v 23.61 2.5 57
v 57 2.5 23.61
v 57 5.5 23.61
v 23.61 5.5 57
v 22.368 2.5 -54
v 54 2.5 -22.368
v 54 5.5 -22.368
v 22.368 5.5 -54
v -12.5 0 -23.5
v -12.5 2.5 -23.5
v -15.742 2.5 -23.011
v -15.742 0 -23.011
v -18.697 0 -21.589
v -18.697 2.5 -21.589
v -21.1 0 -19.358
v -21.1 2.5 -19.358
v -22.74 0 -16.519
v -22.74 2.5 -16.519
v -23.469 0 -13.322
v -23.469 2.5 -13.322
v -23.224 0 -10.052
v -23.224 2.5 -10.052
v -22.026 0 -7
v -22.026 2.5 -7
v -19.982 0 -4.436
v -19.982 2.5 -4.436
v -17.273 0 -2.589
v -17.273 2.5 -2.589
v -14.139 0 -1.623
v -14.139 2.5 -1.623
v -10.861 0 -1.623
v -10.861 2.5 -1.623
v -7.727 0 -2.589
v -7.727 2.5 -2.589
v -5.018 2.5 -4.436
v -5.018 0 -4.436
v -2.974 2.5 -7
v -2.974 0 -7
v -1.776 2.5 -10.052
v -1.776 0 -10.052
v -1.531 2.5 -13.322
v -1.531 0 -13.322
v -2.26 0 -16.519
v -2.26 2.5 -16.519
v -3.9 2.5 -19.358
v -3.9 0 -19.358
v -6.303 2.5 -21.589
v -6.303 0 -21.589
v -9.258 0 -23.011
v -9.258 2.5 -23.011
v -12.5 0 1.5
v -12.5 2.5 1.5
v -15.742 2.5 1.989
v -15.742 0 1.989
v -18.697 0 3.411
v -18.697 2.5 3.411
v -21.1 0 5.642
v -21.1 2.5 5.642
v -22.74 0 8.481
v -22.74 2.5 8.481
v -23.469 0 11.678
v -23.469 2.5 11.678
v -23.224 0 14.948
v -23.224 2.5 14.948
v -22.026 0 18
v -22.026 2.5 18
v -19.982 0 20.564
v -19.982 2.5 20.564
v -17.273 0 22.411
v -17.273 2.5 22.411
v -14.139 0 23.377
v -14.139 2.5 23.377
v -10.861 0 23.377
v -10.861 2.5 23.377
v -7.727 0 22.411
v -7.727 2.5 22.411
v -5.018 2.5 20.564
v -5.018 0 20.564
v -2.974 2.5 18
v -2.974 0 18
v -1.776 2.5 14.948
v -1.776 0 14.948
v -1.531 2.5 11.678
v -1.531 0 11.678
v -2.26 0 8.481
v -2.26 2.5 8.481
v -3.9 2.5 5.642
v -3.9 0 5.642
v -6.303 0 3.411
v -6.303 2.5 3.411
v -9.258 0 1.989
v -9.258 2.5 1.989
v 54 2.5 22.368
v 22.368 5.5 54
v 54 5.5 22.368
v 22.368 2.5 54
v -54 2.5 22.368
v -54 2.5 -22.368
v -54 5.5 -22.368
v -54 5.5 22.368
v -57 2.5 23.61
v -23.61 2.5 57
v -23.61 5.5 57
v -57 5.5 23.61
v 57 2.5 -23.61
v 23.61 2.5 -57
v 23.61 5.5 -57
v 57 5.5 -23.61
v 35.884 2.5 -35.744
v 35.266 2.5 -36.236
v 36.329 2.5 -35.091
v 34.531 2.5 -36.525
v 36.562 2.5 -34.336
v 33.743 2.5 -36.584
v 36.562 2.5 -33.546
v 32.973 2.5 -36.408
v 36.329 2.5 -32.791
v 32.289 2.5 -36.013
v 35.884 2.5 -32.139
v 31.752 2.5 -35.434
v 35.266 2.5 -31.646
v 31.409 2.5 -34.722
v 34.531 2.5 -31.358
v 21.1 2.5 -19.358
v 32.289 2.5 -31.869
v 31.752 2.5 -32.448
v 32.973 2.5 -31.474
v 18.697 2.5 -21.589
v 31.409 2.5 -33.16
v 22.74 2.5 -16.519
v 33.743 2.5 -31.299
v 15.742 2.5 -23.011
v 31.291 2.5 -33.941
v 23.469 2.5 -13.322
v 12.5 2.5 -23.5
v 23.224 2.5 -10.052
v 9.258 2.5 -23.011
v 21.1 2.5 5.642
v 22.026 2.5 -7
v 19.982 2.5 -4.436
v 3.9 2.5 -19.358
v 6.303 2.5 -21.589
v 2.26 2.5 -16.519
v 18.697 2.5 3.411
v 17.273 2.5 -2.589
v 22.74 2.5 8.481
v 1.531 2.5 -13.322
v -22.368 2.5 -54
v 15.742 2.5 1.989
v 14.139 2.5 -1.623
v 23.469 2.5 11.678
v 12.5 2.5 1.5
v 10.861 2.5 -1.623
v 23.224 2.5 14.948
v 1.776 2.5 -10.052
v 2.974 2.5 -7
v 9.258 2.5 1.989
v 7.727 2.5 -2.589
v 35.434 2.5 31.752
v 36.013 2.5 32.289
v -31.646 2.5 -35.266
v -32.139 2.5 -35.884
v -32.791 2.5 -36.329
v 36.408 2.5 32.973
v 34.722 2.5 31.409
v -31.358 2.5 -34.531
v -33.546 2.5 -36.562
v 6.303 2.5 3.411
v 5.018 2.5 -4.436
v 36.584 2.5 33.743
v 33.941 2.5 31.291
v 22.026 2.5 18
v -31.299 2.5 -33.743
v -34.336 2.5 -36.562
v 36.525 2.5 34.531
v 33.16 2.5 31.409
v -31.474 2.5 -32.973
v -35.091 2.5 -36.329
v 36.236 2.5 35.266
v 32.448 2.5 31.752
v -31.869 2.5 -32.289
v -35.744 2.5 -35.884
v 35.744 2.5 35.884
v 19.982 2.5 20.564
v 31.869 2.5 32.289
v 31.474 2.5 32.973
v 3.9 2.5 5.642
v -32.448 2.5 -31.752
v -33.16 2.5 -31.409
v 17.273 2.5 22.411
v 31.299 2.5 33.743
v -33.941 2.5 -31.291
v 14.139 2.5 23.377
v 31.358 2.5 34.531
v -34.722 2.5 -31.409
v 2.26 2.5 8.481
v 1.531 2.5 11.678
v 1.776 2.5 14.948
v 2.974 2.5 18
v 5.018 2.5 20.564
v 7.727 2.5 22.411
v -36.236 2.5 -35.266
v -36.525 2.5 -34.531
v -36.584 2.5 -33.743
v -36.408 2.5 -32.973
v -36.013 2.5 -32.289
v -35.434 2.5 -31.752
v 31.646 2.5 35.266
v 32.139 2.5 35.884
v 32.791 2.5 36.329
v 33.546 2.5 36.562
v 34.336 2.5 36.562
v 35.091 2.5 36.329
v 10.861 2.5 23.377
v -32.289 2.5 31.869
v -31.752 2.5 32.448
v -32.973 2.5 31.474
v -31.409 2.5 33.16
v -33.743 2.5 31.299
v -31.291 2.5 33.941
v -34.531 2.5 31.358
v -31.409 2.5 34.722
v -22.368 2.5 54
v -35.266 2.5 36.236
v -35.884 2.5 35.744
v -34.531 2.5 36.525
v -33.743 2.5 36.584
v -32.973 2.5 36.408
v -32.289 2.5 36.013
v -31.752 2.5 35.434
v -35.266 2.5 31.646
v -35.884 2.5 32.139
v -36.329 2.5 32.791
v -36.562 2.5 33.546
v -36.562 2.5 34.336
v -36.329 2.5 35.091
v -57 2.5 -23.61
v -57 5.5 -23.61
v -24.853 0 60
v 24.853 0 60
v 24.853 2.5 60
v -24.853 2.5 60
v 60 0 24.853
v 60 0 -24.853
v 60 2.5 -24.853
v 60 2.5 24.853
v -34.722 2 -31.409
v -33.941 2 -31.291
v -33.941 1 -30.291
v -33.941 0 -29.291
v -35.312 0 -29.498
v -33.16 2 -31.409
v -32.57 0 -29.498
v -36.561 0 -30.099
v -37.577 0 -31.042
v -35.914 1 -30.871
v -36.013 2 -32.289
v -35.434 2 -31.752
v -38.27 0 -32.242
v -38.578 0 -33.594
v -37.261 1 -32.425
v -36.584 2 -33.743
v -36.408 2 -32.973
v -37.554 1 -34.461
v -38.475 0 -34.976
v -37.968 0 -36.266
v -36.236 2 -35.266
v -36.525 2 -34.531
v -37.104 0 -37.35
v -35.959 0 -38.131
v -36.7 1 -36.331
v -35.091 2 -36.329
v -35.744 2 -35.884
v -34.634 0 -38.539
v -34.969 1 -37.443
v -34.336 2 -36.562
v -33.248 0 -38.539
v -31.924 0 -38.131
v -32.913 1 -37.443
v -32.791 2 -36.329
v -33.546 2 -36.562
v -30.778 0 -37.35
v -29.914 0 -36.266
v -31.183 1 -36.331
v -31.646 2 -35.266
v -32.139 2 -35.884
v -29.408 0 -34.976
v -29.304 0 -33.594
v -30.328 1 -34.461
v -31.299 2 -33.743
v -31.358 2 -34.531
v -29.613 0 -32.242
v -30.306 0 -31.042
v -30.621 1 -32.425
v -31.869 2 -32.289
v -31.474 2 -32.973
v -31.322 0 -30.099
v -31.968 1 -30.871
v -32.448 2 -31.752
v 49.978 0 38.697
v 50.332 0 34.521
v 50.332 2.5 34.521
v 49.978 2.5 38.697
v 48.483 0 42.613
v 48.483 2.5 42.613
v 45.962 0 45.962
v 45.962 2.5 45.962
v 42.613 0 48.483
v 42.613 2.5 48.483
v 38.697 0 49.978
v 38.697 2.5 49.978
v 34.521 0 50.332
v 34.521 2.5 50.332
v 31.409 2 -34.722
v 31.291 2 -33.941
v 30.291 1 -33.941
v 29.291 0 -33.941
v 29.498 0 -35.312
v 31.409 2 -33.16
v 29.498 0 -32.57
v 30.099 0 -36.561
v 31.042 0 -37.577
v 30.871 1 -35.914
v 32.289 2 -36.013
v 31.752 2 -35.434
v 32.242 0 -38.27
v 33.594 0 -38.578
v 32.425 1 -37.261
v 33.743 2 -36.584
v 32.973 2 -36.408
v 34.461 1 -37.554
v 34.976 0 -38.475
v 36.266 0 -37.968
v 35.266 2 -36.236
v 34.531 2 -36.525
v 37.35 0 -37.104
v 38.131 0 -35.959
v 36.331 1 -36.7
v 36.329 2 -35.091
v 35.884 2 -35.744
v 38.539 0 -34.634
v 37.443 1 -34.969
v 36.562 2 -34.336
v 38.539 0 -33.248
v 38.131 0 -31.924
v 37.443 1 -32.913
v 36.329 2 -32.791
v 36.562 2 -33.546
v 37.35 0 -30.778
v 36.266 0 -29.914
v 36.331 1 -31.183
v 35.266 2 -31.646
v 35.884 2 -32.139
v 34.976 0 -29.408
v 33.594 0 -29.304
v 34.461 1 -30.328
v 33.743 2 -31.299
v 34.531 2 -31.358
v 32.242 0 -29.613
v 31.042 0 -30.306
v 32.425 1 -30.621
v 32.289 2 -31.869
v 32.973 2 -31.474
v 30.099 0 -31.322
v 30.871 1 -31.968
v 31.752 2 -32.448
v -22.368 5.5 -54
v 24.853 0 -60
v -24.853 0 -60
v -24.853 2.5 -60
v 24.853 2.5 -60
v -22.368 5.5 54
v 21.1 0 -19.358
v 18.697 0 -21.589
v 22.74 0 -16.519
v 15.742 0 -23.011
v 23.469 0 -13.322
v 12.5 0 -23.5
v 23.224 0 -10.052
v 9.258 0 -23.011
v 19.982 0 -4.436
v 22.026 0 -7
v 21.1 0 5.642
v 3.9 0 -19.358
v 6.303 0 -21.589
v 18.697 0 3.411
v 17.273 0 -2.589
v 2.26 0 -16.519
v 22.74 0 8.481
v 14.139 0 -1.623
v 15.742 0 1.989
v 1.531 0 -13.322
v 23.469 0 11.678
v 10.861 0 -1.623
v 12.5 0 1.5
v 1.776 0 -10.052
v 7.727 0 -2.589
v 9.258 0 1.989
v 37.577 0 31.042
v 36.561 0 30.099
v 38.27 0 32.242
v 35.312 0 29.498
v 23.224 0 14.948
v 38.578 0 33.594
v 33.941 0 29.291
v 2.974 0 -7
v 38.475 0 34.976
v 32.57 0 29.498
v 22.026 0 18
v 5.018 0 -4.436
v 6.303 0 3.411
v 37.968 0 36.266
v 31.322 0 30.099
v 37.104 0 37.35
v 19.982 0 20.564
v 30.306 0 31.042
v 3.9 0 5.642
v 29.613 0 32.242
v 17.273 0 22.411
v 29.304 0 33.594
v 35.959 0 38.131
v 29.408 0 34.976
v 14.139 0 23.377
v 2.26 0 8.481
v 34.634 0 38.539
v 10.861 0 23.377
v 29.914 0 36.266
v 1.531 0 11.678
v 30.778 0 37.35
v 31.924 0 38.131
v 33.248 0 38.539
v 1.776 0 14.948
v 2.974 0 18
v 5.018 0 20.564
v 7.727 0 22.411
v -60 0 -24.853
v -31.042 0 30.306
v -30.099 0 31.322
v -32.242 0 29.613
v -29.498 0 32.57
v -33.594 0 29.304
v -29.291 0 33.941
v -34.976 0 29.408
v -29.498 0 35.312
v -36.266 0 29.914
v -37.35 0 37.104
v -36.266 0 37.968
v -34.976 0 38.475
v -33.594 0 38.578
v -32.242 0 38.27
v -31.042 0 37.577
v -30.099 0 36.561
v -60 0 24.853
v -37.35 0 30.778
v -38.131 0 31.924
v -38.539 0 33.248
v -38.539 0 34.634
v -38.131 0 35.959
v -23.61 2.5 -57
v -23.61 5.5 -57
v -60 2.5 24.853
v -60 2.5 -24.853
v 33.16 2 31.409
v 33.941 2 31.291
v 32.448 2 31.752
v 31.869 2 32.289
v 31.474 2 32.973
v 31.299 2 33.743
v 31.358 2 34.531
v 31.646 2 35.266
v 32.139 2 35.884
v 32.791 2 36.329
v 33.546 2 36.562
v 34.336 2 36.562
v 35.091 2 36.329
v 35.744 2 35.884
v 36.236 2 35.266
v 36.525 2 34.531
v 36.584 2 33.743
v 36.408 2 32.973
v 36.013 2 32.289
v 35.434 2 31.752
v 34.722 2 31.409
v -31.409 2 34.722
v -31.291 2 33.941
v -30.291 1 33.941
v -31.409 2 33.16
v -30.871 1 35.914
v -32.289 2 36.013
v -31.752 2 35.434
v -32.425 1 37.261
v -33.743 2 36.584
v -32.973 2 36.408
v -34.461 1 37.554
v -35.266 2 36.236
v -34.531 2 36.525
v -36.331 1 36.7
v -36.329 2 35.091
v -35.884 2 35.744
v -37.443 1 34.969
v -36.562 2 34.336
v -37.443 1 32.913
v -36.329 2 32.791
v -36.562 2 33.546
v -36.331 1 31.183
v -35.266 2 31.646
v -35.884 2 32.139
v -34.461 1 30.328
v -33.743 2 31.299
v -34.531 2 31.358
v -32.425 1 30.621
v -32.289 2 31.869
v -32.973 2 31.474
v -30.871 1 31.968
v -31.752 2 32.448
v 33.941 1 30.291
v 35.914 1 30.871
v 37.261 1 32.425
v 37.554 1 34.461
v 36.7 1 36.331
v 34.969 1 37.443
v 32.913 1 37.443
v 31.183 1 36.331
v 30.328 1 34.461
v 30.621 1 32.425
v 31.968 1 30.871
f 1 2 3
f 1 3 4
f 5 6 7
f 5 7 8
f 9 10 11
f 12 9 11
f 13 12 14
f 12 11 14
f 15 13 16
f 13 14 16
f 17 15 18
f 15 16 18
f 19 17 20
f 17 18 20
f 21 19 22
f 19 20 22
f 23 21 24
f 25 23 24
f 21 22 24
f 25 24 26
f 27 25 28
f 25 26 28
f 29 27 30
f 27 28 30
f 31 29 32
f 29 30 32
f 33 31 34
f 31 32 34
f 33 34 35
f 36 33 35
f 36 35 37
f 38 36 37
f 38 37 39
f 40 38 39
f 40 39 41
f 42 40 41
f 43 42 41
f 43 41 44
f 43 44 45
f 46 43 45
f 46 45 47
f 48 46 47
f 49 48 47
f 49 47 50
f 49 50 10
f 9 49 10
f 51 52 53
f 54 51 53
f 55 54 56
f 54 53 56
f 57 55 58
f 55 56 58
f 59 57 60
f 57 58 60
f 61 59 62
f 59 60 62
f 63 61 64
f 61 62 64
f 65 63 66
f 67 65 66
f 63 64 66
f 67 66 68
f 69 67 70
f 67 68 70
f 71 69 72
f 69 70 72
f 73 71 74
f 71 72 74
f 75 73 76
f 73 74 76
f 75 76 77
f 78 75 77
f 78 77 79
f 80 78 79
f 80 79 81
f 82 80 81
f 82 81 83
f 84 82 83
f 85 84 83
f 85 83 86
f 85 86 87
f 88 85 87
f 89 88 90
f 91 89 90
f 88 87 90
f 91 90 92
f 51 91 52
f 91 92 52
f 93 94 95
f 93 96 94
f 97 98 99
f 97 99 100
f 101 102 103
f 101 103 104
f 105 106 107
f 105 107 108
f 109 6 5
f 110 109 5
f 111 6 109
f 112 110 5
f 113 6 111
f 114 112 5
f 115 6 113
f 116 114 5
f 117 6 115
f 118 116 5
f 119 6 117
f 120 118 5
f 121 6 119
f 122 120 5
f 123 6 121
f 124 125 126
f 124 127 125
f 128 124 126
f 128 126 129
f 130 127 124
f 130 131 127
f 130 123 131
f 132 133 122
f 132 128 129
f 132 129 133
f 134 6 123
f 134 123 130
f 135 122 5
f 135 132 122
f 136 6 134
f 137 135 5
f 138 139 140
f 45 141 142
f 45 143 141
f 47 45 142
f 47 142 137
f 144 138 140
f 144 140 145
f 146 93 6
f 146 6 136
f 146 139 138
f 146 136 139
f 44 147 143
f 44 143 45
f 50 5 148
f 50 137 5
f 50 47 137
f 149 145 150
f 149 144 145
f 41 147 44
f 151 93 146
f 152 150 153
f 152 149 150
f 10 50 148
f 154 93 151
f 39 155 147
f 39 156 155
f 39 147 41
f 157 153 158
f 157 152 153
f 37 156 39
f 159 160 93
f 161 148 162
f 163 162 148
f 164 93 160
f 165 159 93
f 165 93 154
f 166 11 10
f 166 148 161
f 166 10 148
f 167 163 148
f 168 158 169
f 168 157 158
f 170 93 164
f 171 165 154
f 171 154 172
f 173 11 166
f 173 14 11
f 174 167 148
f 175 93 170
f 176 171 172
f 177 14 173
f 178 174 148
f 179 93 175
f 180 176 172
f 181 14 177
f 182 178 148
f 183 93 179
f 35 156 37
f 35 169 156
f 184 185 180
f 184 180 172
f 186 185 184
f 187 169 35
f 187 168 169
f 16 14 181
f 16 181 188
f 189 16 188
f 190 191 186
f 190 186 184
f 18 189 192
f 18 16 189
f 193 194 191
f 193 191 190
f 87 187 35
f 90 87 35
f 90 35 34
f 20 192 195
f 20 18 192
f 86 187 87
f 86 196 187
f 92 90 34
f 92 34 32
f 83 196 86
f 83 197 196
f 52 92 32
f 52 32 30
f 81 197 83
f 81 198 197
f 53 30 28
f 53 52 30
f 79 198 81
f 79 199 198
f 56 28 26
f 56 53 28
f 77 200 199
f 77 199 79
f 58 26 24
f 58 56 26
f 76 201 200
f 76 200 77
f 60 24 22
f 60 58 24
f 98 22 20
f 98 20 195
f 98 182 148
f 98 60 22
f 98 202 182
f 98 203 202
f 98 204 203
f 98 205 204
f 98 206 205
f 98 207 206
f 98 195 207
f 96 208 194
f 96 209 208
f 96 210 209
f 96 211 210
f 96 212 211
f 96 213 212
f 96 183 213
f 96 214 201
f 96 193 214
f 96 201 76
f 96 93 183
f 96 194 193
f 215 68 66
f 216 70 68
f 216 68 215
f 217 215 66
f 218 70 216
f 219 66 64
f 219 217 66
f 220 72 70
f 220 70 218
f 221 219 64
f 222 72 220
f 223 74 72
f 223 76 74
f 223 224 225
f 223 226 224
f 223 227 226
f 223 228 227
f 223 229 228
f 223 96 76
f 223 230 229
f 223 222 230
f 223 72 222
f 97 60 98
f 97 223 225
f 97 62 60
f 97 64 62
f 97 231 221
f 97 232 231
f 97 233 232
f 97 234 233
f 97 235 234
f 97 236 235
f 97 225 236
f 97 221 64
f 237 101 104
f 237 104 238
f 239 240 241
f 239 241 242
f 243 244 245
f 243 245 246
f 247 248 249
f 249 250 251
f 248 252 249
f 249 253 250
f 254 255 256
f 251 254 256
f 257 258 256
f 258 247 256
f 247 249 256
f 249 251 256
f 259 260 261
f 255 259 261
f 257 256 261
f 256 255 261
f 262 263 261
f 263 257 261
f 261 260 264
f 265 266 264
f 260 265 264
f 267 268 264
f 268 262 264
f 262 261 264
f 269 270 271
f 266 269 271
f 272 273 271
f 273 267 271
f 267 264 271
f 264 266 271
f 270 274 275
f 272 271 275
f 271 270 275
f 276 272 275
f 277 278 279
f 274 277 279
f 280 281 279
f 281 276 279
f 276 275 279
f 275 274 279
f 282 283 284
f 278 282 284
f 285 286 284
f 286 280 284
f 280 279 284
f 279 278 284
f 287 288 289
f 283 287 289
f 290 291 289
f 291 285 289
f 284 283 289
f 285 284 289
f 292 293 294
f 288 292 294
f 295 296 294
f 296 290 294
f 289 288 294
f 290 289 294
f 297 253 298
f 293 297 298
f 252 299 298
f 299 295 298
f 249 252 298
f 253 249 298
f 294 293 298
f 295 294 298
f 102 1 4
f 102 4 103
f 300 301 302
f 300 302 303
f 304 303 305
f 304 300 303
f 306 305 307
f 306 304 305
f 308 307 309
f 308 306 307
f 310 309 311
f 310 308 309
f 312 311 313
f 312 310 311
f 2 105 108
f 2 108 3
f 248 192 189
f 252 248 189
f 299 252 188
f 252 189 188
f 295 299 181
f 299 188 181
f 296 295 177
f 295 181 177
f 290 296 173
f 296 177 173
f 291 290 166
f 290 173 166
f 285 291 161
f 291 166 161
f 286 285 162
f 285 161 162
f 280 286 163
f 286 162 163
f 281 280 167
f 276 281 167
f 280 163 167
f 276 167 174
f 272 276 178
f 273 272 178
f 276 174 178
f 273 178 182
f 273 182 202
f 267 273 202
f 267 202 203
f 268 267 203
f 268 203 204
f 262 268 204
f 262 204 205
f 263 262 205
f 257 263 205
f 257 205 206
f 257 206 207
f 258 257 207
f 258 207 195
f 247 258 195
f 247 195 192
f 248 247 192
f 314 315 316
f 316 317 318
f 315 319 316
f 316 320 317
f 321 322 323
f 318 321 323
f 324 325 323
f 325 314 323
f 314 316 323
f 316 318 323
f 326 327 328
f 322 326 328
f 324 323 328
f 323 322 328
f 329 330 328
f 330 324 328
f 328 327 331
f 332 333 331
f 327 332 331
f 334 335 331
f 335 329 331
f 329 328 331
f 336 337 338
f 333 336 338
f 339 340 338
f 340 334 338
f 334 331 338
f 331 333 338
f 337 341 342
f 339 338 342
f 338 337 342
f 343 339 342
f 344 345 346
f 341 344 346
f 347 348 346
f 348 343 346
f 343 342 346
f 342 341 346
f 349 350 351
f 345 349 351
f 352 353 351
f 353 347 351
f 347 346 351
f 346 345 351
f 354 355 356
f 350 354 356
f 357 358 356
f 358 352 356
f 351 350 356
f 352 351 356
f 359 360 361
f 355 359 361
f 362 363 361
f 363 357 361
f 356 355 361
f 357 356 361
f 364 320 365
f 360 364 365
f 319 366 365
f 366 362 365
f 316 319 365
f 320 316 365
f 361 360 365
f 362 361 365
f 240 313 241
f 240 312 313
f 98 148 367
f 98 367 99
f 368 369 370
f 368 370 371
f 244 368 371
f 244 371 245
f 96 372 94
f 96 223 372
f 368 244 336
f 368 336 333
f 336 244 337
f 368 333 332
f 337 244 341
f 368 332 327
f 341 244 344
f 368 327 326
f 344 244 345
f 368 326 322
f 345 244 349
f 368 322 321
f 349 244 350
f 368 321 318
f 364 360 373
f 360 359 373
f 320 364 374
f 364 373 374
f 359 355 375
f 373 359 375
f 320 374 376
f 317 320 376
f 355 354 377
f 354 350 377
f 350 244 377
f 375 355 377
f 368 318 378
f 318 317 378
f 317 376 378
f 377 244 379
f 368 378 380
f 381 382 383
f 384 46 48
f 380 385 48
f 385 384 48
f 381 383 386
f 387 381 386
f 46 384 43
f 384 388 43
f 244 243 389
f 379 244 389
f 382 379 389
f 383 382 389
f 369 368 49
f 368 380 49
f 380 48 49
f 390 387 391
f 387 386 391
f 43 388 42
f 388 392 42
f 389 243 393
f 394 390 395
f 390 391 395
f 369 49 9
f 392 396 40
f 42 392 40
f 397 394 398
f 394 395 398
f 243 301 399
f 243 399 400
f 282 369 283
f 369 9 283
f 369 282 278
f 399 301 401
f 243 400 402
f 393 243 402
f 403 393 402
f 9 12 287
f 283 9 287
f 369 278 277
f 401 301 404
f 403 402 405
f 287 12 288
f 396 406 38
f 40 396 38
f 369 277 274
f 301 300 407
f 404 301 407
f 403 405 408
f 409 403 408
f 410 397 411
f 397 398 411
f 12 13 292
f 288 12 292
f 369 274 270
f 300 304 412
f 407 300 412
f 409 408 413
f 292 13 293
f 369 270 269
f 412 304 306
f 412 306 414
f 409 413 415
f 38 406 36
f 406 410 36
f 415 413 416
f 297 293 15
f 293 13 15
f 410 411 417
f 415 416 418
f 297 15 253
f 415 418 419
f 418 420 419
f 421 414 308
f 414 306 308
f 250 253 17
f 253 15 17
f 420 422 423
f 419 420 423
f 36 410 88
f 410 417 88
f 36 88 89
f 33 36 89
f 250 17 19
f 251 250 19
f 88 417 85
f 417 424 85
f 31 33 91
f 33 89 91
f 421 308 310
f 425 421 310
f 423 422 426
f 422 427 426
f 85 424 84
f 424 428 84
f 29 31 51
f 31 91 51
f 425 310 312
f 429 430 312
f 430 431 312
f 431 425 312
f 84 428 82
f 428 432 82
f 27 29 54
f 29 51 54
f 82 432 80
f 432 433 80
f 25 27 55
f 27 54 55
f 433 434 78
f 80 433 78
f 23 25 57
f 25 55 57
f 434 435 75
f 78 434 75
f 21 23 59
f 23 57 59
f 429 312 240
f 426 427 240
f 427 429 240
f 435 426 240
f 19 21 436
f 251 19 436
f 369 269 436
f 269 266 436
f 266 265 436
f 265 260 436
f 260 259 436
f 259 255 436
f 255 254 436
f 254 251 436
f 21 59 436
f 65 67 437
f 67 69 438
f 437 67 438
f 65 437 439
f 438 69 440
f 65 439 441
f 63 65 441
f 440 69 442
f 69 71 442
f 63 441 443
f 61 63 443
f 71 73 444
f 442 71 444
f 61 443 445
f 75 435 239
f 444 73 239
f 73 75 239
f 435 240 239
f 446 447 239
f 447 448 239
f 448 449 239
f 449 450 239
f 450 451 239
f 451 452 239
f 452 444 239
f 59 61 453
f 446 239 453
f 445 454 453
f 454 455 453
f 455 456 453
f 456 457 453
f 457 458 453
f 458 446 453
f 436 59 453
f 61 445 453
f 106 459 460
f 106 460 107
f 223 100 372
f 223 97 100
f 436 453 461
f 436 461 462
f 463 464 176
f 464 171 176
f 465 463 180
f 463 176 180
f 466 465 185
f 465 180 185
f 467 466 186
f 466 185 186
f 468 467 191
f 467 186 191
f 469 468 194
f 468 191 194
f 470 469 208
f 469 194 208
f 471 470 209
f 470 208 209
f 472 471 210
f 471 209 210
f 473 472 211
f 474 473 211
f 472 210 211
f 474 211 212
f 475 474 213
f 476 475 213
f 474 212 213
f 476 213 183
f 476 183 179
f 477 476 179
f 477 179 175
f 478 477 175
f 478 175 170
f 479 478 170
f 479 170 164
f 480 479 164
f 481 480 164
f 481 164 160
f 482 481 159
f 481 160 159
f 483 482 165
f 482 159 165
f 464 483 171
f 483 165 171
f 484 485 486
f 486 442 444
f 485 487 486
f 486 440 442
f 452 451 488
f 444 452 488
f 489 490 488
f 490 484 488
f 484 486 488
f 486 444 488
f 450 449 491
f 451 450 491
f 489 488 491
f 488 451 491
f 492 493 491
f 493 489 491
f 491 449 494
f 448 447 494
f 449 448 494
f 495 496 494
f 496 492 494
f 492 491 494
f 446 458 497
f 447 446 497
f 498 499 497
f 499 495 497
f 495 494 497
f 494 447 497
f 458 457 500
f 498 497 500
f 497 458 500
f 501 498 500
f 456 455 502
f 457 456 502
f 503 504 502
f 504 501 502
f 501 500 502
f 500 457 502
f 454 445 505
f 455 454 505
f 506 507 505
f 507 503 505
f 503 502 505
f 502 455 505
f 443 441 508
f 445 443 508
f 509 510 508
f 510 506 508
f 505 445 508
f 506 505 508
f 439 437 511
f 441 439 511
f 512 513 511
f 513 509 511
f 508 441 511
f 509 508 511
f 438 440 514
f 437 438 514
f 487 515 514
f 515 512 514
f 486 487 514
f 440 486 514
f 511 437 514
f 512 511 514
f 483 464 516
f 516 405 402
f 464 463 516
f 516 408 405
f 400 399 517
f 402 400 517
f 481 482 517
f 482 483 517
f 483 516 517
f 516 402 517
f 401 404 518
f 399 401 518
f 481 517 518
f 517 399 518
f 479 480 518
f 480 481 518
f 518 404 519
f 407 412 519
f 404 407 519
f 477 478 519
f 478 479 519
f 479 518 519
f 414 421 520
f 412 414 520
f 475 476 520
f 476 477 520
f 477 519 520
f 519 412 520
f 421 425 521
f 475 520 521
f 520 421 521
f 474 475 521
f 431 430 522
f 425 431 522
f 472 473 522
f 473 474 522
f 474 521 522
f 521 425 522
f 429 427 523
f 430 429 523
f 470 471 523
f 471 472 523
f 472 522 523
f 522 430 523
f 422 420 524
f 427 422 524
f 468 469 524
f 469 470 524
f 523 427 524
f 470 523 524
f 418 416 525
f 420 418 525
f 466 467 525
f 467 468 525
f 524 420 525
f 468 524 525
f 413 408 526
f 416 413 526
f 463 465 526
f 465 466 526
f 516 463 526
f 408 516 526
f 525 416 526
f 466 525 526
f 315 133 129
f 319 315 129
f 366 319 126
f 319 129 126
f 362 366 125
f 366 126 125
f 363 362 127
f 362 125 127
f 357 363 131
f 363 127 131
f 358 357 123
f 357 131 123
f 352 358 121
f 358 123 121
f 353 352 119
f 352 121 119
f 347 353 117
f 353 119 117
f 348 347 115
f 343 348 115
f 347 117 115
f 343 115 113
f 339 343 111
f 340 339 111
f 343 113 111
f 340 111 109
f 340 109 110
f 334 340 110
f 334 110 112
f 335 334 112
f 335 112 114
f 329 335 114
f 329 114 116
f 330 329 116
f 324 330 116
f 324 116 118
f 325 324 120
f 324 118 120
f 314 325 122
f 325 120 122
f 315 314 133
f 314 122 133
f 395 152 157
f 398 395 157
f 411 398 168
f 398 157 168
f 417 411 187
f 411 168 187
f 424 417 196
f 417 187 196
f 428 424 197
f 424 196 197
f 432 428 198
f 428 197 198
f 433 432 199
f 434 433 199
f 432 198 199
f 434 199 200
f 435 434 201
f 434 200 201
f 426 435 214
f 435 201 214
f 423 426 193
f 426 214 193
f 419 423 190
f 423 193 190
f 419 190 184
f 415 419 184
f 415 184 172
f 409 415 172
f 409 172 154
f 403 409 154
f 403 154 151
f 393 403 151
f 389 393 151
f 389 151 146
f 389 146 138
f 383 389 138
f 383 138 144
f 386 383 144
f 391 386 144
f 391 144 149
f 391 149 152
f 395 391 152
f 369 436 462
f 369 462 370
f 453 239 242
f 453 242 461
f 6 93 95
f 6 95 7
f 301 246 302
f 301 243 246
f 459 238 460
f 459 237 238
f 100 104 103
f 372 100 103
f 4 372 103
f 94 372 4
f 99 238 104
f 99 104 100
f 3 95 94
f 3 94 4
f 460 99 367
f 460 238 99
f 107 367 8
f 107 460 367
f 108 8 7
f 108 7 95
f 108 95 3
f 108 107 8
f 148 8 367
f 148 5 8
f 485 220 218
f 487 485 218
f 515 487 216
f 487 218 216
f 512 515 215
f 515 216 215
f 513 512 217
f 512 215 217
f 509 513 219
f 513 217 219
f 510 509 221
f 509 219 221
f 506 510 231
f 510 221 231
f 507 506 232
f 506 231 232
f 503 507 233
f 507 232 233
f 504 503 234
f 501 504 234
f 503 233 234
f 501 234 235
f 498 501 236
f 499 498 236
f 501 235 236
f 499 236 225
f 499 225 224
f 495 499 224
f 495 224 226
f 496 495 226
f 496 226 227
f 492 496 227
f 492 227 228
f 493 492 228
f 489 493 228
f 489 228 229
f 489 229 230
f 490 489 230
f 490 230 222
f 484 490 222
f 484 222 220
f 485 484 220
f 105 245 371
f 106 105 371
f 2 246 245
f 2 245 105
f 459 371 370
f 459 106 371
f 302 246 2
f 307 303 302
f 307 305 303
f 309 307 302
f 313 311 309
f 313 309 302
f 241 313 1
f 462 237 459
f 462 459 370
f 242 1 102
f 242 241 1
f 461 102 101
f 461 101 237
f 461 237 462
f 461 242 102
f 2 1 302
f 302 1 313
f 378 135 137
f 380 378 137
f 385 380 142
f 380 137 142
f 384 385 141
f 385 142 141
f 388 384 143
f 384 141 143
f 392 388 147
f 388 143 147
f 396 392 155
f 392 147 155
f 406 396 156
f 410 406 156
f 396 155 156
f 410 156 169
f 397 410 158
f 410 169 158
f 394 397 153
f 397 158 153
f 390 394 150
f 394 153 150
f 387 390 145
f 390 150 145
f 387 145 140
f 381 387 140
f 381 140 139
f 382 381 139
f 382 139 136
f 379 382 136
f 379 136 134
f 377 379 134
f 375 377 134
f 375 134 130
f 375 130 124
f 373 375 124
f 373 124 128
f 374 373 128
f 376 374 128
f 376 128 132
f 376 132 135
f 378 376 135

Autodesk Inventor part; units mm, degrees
ref_plane "YZ Plane" through (0, 0, 0) normal (1, 0, 0) x (0, 1, 0)
ref_plane "XZ Plane" through (0, 0, 0) normal (0, 1, 0) x (-1, 0, 0)
ref_plane "XY Plane" through (0, 0, 0) normal (0, 0, 1) x (1, 0, 0)
sketch "Skizze4" plane through (0, 0, 0) normal (0, 1, 0) x (-1, 0, 0)
  line L0 (24.8528, 60) -> (60, 24.8528)
  line L1 (60, 24.8528) -> (60, -24.8528)
  line L2 (60, -24.8528) -> (24.8528, -60)
  line L3 (24.8528, -60) -> (-24.8528, -60)
  line L4 (-24.8528, -60) -> (-60, -24.8528)
  line L5 (-60, -24.8528) -> (-60, 24.8528)
  line L6 (-60, 24.8528) -> (-24.8528, 60)
  line L7 (-24.8528, 60) -> (24.8528, 60)
  line L8 (0, -84) -> (0, 84) construction
  line L9 (84, 0) -> (-84, 0) construction
  point P0 (0, 0)
  point P1 (0, 0)
  dimension "d4" = 120
extrude "Extrusion2" add sketch "Skizze4" along normal blind 2.5
sketch "Skizze9" plane through (0, 2.5, 0) normal (0, 1, 0) x (1, 0, 0)
  line L0 (-60, -24.8528) -> (-24.8528, -60) construction
  line L1 (-24.8528, -60) -> (24.8528, -60) construction
  line L2 (24.8528, -60) -> (60, -24.8528) construction
  line L3 (60, -24.8528) -> (60, 24.8528) construction
  line L4 (60, 24.8528) -> (24.8528, 60) construction
  line L5 (24.8528, 60) -> (-24.8528, 60) construction
  line L6 (-24.8528, 60) -> (-60, 24.8528) construction
  line L7 (-60, 24.8528) -> (-60, -24.8528) construction
  line L8 (-23.6102, -57) -> (-57, -23.6102)
  line L9 (-57, -23.6102) -> (-57, 23.6102)
  line L10 (-57, 23.6102) -> (-23.6102, 57)
  line L11 (-23.6102, 57) -> (23.6102, 57)
  line L12 (23.6102, 57) -> (57, 23.6102)
  line L13 (57, 23.6102) -> (57, -23.6102)
  line L14 (57, -23.6102) -> (23.6102, -57)
  line L15 (23.6102, -57) -> (-23.6102, -57)
  line L16 (-54, -22.3675) -> (-22.3675, -54)
  line L17 (-22.3675, -54) -> (22.3675, -54)
  line L18 (22.3675, -54) -> (54, -22.3675)
  line L19 (54, -22.3675) -> (54, 22.3675)
  line L20 (54, 22.3675) -> (22.3675, 54)
  line L21 (22.3675, 54) -> (-22.3675, 54)
  line L22 (-22.3675, 54) -> (-54, 22.3675)
  line L23 (-54, 22.3675) -> (-54, -22.3675)
  point P0 (0, 0)
  dimension "d20" = 3
  dimension "d21" = 3
extrude "Extrusion6" add sketch "Skizze9" along normal blind 3
sketch "Skizze7" plane through (0, 0, 0) normal (0, -1, 0) x (1, 0, 0)
  line L0 (-24.8528, 60) -> (-60, 24.8528) construction
  line L1 (-60, 24.8528) -> (-60, -24.8528) construction
  line L2 (-60, -24.8528) -> (-24.8528, -60) construction
  line L3 (-24.8528, -60) -> (24.8528, -60) construction
  line L4 (24.8528, -60) -> (60, -24.8528) construction
  line L5 (60, -24.8528) -> (60, 24.8528) construction
  line L6 (60, 24.8528) -> (24.8528, 60)
  line L7 (24.8528, 60) -> (-24.8528, 60) construction
  line L8 (-84, 0) -> (84, 0) construction
  arc A0 (50.3321, 34.5207) -> (34.5207, 50.3321) centre (35.3553, 35.3553) ccw
  line L9 (35.3553, 35.3553) -> (49.4431, 49.4431) construction
  line L10 (50.3321, 34.5207) -> (34.5207, 50.3321) construction
  point P0 (0, 0)
  dimension "d61" = 10
  dimension "d62" = 15
  dimension "d63" = 49.7056
  dimension "d64" = 24.8528
extrude "Extrusion5" add sketch "Skizze7" against normal up to surface (2.5 mm away)
sketch "Skizze11" plane through (0, 0, 0) normal (0, -1, 0) x (1, 0, 0)
  line L0 (-84, 0) -> (84, 0) construction
  line L1 (0, -84) -> (0, 84) construction
  point P0 (0, 0)
  point P1 (-12.5, 12.5)
  point P2 (-12.5, -12.5)
  point P3 (12.5, -12.5)
  point P4 (12.5, 12.5)
  dimension "d27" = 12.5
  dimension "d31" = 12.5
  dimension "d34" = 360
hole "Bohrung1" at (-12.5, 0, 12.5) at (-12.5, 0, -12.5) at (12.5, 0, -12.5) at (12.5, 0, 12.5) direction (0, 1, 0) diameter 22 end through all
sketch "Skizze12" plane through (0, 0, 0) normal (0, -1, 0) x (1, 0, 0)
  line L0 (-24.8528, 60) -> (-60, 24.8528) projected
  line L1 (60, 24.8528) -> (24.8528, 60) projected
  line L2 (24.8528, -60) -> (60, -24.8528) projected
  line L3 (-60, -24.8528) -> (-24.8528, -60) projected
  line L4 (24.8528, 60) -> (24.8528, 24.8528) construction
  line L5 (24.8528, 24.8528) -> (60, 24.8528) construction
  line L6 (24.8528, 24.8528) -> (42.4264, 42.4264) construction
  line L7 (24.8528, 60) -> (-24.8528, 60) construction
  point P0 (0, 0)
  point P1 (33.9411, 33.9411)
  dimension "d44" = 12
  dimension "d47" = 45
hole "Bohrung2" at (33.9411, 0, 33.9411) direction (0, 1, 0) diameter 5.3 end through all
pattern_circular "Runde Anordnung1" count 4 over 360 about axis through (0, -10, 0) along (0, 1, 0) of "Bohrung2"
chamfer "Fase1" distance 2 angle 45 4 edges at (36.5911, 0, -33.9411) (33.9411, 0, 36.5911) (-36.5911, 0, 33.9411) (-33.9411, 0, -36.5911)
equation "\"d64\" = 0.5 * d63"
equation "\"d31\" = d27"
equation "\"d44\" = d43"
equation "\"d43\" = 12"
properties part number "Oktagon_Deckel" material "PC/ABS-Kunststoff"
